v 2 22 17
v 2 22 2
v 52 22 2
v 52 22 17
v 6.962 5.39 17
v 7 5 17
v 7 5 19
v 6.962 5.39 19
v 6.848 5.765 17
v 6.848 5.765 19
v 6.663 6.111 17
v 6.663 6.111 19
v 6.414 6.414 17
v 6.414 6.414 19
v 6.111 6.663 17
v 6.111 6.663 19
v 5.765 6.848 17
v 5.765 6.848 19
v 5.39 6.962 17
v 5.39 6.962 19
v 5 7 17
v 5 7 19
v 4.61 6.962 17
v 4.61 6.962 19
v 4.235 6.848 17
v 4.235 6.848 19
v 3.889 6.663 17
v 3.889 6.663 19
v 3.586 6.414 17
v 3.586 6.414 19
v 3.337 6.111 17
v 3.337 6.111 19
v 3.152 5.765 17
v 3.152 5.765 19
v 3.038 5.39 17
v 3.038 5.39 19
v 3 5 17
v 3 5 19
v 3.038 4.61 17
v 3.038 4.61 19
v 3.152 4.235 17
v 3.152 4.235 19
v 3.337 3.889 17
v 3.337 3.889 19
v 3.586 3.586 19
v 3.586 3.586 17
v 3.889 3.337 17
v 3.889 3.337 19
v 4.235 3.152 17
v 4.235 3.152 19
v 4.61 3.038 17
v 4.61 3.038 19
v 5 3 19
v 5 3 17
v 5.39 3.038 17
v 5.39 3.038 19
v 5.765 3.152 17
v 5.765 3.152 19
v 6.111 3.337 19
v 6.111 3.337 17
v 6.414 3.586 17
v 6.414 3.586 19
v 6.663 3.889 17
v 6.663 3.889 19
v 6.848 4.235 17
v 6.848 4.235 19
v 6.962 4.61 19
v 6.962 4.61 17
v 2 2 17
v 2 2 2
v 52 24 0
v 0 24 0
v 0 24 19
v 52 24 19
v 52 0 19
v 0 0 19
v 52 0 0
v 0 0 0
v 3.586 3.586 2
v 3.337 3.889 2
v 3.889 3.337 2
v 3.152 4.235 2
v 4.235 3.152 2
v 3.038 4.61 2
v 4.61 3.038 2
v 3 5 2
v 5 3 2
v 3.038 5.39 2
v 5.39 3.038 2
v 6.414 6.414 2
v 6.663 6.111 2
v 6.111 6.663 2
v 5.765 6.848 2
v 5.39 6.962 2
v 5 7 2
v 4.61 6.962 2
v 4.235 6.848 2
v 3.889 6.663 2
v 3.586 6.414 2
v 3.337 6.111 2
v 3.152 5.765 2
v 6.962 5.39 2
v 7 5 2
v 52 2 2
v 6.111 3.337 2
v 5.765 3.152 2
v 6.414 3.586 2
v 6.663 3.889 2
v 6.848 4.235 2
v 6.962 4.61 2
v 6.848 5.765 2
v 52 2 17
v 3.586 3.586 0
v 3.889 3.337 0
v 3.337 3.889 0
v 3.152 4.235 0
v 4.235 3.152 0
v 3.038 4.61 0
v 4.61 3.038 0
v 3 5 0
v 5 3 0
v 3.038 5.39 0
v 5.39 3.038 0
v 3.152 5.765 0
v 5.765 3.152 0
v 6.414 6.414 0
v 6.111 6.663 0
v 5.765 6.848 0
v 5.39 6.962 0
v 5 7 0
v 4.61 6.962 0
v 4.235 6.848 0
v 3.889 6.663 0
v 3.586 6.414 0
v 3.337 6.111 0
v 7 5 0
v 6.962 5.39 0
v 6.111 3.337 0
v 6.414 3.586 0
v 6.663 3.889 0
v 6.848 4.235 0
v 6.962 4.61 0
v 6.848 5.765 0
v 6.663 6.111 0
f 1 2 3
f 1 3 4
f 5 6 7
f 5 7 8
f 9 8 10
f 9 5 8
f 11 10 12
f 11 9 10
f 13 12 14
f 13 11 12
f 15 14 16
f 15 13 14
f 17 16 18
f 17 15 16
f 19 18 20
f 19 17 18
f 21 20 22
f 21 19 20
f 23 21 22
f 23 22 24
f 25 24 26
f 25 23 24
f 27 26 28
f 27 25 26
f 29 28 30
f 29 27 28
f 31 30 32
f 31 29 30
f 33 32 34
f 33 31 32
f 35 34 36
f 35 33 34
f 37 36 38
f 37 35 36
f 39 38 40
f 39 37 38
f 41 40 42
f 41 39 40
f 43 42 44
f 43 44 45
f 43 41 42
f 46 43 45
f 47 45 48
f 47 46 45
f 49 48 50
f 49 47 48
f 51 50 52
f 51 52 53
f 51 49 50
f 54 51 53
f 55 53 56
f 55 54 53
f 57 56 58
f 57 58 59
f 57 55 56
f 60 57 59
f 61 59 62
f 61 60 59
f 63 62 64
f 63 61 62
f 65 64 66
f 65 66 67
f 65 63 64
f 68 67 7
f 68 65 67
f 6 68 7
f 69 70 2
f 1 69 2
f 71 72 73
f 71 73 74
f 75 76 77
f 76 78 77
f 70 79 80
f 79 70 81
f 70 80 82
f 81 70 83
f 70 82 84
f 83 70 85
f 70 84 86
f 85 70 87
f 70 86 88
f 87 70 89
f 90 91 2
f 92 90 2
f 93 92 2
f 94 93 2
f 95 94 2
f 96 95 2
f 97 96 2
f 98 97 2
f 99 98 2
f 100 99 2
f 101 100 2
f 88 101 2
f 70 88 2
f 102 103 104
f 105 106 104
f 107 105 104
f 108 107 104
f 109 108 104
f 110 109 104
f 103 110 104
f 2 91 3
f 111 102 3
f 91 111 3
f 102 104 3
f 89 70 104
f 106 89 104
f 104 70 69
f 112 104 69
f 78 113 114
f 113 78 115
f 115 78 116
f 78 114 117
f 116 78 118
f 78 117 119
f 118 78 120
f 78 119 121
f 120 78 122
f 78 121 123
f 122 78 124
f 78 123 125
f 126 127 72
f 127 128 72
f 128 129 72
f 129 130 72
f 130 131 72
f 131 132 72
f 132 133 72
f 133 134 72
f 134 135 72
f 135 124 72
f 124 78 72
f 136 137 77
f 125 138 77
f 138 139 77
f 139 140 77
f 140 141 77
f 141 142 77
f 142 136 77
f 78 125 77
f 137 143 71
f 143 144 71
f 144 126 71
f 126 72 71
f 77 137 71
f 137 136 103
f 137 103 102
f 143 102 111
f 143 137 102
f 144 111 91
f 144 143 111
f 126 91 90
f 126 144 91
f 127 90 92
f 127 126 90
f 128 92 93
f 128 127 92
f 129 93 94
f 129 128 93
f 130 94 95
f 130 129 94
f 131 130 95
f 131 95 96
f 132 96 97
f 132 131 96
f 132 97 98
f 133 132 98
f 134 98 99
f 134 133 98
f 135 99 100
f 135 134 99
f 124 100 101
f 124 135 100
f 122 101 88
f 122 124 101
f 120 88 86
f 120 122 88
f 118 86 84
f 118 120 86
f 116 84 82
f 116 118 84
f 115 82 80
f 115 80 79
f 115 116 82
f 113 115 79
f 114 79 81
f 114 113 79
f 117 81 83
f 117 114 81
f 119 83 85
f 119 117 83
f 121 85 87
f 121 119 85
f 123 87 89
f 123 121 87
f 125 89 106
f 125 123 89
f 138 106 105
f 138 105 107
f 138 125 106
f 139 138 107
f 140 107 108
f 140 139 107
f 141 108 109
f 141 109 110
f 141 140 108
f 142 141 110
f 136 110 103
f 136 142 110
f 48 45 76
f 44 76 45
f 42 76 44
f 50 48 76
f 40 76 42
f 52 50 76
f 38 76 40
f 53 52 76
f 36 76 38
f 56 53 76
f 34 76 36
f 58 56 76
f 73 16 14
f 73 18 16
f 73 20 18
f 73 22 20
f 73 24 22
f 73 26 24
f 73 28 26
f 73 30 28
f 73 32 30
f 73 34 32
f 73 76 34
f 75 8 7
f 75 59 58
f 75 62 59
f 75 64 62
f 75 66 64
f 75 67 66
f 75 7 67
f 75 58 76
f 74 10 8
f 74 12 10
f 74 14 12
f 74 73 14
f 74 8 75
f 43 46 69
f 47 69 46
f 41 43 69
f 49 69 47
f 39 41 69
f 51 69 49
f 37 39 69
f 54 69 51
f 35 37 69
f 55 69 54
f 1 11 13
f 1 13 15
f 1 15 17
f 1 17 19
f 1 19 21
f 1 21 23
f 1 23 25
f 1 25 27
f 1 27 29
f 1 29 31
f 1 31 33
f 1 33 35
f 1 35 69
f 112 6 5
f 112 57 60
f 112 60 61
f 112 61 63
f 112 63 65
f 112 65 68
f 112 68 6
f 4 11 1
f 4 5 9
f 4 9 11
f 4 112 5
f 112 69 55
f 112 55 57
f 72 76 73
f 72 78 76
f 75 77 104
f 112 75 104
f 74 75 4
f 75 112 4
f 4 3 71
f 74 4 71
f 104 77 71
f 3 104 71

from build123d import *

# Parameters (mm, degrees)
F0_W     = 52
F0_H     = 24
F0_R     = 2
F1_DEPTH = 2
F2_W     = 52
F2_H     = 24
F2_W_2   = 48
F2_H_2   = 20
F3_DEPTH = 15
F4_W     = 52
F4_H     = 24
F4_R     = 2
F5_DEPTH = 2
F6_W     = 20
F6_H     = 15
F7_DEPTH = 2


with BuildPart() as f1:
    # F0 (on Top) → F1 (new body)
    with BuildSketch(Plane.XY):
        with Locations((26, 12)):
            Rectangle(F0_W, F0_H)
        with Locations((5, 5)):
            Circle(F0_R, mode=Mode.SUBTRACT)
    extrude(amount=F1_DEPTH)

    # F2 (on face) → F3 (join)
    with BuildSketch(Plane.XY.offset(2)):
        with Locations((26, 12)):
            Rectangle(F2_W, F2_H)
        with Locations((26, 12)):
            Rectangle(F2_W_2, F2_H_2, mode=Mode.SUBTRACT)
    extrude(amount=F3_DEPTH)

    # F4 (on face) → F5 (join)
    with BuildSketch(Plane.XY.offset(17)):
        with Locations((26, 12)):
            Rectangle(F4_W, F4_H)
        with Locations((5, 5)):
            Circle(F4_R, mode=Mode.SUBTRACT)
    extrude(amount=F5_DEPTH)

    # F6 (on face) → F7 (cut, through all)
    with BuildSketch(Plane.YZ.offset(52)):
        with Locations((12, 9.5)):
            Rectangle(F6_W, F6_H)
    extrude(amount=-F7_DEPTH, mode=Mode.SUBTRACT)


solid = f1.part
